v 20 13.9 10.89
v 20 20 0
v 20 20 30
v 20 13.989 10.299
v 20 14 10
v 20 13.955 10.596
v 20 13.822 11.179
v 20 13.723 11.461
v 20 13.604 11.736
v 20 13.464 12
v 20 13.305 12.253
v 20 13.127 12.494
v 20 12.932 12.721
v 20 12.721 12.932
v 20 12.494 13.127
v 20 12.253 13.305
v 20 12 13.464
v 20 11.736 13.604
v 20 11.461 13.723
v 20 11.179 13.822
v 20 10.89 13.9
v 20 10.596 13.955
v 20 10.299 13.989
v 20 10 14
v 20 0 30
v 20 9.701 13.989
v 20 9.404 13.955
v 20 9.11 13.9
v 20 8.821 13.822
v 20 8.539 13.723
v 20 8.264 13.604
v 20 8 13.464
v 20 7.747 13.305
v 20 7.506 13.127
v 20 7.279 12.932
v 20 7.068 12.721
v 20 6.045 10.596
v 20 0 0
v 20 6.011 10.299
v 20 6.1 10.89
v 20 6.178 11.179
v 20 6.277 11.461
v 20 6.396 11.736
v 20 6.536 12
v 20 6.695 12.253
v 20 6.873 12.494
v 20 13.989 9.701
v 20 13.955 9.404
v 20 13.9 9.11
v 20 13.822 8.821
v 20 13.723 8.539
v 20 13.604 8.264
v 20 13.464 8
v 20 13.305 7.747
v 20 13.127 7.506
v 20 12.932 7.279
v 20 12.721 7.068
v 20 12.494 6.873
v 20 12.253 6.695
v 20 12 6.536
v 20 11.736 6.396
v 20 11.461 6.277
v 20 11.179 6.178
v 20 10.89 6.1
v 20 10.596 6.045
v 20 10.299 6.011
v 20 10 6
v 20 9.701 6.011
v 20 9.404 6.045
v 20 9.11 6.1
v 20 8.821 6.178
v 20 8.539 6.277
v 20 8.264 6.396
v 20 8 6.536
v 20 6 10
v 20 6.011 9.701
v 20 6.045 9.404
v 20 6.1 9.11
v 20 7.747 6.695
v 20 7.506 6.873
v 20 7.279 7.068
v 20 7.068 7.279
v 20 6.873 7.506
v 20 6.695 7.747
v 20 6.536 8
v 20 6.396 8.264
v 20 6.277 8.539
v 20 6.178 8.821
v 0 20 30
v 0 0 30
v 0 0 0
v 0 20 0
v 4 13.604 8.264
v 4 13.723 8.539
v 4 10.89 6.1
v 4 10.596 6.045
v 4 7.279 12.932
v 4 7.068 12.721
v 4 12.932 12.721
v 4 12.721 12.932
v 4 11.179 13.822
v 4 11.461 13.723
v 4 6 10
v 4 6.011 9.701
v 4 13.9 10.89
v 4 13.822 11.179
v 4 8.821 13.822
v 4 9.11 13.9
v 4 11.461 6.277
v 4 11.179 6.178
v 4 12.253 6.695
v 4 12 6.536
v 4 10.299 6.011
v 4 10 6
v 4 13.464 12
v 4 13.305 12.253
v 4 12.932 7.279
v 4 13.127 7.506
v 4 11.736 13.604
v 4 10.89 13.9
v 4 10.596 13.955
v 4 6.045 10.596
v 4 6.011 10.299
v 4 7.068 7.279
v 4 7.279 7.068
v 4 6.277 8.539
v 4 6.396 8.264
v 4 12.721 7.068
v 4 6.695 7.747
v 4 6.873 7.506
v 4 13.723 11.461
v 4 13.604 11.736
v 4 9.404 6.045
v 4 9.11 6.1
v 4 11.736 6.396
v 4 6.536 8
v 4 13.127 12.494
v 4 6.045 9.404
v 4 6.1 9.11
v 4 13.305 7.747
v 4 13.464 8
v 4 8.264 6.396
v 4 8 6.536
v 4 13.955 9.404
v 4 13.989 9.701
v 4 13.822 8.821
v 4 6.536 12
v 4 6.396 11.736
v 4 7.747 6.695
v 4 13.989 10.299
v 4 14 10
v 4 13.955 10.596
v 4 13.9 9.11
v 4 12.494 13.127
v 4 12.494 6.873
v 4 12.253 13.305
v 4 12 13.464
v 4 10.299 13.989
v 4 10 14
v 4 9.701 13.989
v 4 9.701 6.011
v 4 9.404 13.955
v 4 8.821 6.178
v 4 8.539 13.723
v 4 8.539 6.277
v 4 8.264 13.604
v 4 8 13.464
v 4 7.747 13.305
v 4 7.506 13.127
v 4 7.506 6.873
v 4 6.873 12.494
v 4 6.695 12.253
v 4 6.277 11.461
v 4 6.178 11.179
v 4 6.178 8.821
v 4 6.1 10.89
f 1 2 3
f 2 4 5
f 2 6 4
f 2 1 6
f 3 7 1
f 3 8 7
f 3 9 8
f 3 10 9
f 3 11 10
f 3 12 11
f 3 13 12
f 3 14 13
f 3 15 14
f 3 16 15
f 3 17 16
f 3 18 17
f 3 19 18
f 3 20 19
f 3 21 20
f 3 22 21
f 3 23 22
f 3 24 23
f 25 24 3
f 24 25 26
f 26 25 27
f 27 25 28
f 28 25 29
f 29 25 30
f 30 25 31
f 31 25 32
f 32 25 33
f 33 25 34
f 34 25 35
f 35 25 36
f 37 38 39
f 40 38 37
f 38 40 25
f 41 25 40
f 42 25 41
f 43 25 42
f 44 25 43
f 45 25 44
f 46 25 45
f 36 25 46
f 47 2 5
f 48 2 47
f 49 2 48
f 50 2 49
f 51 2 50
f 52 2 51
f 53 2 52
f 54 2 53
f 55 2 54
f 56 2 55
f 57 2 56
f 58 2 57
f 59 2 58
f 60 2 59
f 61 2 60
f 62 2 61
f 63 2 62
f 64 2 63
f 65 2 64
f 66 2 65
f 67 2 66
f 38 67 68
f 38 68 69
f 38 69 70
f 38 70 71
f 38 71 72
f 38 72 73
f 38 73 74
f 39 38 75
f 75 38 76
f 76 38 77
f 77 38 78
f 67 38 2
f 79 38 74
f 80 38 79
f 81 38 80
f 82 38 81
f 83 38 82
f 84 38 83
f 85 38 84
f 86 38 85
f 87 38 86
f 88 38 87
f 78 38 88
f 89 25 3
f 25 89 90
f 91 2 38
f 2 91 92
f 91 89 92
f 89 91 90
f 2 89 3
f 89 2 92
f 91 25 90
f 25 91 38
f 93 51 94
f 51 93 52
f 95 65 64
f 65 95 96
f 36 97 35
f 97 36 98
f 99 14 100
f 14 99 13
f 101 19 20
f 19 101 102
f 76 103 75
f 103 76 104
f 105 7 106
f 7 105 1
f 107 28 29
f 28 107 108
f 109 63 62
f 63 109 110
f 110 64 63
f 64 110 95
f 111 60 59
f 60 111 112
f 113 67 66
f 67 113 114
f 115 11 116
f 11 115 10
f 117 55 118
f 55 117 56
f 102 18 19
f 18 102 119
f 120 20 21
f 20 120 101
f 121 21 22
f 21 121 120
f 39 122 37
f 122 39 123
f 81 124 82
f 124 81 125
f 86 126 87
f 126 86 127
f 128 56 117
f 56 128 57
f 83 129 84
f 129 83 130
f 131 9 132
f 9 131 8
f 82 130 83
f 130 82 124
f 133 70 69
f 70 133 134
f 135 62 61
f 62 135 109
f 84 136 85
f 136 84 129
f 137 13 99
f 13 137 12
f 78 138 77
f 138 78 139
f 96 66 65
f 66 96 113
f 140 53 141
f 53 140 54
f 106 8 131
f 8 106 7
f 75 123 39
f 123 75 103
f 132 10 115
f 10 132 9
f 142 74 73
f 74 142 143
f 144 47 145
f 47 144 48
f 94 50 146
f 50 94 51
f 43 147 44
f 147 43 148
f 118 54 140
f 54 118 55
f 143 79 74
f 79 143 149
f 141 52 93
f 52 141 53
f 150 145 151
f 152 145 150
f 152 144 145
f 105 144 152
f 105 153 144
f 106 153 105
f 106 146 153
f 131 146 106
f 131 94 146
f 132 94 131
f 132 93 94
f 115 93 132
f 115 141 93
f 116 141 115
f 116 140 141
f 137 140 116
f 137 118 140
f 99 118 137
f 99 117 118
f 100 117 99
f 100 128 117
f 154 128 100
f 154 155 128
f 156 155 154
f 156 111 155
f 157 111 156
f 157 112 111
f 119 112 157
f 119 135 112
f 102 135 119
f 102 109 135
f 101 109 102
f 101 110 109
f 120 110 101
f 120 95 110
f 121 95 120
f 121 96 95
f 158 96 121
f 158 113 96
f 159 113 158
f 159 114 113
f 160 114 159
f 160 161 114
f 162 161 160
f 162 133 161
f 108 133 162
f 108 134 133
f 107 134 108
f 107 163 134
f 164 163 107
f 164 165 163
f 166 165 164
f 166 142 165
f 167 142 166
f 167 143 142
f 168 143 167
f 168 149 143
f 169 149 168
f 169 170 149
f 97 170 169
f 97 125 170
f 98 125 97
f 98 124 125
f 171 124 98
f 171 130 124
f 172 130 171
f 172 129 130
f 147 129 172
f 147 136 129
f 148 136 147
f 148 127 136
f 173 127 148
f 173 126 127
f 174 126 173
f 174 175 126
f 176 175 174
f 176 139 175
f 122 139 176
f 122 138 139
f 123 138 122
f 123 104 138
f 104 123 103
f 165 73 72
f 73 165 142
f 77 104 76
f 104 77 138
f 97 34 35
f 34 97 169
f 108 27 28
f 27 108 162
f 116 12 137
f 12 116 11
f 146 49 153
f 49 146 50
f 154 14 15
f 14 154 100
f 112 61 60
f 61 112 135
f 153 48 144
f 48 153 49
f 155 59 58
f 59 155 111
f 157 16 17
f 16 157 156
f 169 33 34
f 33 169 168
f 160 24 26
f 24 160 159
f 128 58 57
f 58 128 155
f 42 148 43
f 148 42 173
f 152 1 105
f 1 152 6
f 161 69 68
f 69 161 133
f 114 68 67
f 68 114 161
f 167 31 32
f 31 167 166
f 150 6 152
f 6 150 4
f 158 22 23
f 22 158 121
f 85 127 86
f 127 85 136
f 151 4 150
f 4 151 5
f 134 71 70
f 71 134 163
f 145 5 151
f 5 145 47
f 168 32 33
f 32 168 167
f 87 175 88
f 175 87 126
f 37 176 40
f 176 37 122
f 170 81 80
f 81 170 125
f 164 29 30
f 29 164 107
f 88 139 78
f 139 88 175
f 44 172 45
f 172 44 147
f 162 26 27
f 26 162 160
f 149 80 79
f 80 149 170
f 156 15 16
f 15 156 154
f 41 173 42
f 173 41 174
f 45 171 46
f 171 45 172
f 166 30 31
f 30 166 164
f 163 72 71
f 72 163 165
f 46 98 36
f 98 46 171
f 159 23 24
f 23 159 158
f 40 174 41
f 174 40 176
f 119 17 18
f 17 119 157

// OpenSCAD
// Direct reproduction of INCIDENTS.md 2026-08-19 ("bearing bores never reached
// the tower's true exterior surface"): a bearing tower whose bore measures the
// right diameter (check_features.py is happy) and which is one connected
// watertight solid (check_connectivity.py is happy) -- but the bore never
// reaches the exterior, so nothing can be inserted.
//
// The pocket is drilled from the +X face and stops 4mm short of the -X face:
// the declared path from outside to the seat runs through solid material.

$fa = 2; $fs = 0.3;

// EXPECTED_BBOX: [20, 20, 30]

difference() {
    cube([20, 20, 30]);
    // pocket spans x = 4 .. 24 -- enters through +X, stops inside
    translate([14, 10, 10]) rotate([0, 90, 0]) cylinder(d = 8, h = 20, center = true);
}
